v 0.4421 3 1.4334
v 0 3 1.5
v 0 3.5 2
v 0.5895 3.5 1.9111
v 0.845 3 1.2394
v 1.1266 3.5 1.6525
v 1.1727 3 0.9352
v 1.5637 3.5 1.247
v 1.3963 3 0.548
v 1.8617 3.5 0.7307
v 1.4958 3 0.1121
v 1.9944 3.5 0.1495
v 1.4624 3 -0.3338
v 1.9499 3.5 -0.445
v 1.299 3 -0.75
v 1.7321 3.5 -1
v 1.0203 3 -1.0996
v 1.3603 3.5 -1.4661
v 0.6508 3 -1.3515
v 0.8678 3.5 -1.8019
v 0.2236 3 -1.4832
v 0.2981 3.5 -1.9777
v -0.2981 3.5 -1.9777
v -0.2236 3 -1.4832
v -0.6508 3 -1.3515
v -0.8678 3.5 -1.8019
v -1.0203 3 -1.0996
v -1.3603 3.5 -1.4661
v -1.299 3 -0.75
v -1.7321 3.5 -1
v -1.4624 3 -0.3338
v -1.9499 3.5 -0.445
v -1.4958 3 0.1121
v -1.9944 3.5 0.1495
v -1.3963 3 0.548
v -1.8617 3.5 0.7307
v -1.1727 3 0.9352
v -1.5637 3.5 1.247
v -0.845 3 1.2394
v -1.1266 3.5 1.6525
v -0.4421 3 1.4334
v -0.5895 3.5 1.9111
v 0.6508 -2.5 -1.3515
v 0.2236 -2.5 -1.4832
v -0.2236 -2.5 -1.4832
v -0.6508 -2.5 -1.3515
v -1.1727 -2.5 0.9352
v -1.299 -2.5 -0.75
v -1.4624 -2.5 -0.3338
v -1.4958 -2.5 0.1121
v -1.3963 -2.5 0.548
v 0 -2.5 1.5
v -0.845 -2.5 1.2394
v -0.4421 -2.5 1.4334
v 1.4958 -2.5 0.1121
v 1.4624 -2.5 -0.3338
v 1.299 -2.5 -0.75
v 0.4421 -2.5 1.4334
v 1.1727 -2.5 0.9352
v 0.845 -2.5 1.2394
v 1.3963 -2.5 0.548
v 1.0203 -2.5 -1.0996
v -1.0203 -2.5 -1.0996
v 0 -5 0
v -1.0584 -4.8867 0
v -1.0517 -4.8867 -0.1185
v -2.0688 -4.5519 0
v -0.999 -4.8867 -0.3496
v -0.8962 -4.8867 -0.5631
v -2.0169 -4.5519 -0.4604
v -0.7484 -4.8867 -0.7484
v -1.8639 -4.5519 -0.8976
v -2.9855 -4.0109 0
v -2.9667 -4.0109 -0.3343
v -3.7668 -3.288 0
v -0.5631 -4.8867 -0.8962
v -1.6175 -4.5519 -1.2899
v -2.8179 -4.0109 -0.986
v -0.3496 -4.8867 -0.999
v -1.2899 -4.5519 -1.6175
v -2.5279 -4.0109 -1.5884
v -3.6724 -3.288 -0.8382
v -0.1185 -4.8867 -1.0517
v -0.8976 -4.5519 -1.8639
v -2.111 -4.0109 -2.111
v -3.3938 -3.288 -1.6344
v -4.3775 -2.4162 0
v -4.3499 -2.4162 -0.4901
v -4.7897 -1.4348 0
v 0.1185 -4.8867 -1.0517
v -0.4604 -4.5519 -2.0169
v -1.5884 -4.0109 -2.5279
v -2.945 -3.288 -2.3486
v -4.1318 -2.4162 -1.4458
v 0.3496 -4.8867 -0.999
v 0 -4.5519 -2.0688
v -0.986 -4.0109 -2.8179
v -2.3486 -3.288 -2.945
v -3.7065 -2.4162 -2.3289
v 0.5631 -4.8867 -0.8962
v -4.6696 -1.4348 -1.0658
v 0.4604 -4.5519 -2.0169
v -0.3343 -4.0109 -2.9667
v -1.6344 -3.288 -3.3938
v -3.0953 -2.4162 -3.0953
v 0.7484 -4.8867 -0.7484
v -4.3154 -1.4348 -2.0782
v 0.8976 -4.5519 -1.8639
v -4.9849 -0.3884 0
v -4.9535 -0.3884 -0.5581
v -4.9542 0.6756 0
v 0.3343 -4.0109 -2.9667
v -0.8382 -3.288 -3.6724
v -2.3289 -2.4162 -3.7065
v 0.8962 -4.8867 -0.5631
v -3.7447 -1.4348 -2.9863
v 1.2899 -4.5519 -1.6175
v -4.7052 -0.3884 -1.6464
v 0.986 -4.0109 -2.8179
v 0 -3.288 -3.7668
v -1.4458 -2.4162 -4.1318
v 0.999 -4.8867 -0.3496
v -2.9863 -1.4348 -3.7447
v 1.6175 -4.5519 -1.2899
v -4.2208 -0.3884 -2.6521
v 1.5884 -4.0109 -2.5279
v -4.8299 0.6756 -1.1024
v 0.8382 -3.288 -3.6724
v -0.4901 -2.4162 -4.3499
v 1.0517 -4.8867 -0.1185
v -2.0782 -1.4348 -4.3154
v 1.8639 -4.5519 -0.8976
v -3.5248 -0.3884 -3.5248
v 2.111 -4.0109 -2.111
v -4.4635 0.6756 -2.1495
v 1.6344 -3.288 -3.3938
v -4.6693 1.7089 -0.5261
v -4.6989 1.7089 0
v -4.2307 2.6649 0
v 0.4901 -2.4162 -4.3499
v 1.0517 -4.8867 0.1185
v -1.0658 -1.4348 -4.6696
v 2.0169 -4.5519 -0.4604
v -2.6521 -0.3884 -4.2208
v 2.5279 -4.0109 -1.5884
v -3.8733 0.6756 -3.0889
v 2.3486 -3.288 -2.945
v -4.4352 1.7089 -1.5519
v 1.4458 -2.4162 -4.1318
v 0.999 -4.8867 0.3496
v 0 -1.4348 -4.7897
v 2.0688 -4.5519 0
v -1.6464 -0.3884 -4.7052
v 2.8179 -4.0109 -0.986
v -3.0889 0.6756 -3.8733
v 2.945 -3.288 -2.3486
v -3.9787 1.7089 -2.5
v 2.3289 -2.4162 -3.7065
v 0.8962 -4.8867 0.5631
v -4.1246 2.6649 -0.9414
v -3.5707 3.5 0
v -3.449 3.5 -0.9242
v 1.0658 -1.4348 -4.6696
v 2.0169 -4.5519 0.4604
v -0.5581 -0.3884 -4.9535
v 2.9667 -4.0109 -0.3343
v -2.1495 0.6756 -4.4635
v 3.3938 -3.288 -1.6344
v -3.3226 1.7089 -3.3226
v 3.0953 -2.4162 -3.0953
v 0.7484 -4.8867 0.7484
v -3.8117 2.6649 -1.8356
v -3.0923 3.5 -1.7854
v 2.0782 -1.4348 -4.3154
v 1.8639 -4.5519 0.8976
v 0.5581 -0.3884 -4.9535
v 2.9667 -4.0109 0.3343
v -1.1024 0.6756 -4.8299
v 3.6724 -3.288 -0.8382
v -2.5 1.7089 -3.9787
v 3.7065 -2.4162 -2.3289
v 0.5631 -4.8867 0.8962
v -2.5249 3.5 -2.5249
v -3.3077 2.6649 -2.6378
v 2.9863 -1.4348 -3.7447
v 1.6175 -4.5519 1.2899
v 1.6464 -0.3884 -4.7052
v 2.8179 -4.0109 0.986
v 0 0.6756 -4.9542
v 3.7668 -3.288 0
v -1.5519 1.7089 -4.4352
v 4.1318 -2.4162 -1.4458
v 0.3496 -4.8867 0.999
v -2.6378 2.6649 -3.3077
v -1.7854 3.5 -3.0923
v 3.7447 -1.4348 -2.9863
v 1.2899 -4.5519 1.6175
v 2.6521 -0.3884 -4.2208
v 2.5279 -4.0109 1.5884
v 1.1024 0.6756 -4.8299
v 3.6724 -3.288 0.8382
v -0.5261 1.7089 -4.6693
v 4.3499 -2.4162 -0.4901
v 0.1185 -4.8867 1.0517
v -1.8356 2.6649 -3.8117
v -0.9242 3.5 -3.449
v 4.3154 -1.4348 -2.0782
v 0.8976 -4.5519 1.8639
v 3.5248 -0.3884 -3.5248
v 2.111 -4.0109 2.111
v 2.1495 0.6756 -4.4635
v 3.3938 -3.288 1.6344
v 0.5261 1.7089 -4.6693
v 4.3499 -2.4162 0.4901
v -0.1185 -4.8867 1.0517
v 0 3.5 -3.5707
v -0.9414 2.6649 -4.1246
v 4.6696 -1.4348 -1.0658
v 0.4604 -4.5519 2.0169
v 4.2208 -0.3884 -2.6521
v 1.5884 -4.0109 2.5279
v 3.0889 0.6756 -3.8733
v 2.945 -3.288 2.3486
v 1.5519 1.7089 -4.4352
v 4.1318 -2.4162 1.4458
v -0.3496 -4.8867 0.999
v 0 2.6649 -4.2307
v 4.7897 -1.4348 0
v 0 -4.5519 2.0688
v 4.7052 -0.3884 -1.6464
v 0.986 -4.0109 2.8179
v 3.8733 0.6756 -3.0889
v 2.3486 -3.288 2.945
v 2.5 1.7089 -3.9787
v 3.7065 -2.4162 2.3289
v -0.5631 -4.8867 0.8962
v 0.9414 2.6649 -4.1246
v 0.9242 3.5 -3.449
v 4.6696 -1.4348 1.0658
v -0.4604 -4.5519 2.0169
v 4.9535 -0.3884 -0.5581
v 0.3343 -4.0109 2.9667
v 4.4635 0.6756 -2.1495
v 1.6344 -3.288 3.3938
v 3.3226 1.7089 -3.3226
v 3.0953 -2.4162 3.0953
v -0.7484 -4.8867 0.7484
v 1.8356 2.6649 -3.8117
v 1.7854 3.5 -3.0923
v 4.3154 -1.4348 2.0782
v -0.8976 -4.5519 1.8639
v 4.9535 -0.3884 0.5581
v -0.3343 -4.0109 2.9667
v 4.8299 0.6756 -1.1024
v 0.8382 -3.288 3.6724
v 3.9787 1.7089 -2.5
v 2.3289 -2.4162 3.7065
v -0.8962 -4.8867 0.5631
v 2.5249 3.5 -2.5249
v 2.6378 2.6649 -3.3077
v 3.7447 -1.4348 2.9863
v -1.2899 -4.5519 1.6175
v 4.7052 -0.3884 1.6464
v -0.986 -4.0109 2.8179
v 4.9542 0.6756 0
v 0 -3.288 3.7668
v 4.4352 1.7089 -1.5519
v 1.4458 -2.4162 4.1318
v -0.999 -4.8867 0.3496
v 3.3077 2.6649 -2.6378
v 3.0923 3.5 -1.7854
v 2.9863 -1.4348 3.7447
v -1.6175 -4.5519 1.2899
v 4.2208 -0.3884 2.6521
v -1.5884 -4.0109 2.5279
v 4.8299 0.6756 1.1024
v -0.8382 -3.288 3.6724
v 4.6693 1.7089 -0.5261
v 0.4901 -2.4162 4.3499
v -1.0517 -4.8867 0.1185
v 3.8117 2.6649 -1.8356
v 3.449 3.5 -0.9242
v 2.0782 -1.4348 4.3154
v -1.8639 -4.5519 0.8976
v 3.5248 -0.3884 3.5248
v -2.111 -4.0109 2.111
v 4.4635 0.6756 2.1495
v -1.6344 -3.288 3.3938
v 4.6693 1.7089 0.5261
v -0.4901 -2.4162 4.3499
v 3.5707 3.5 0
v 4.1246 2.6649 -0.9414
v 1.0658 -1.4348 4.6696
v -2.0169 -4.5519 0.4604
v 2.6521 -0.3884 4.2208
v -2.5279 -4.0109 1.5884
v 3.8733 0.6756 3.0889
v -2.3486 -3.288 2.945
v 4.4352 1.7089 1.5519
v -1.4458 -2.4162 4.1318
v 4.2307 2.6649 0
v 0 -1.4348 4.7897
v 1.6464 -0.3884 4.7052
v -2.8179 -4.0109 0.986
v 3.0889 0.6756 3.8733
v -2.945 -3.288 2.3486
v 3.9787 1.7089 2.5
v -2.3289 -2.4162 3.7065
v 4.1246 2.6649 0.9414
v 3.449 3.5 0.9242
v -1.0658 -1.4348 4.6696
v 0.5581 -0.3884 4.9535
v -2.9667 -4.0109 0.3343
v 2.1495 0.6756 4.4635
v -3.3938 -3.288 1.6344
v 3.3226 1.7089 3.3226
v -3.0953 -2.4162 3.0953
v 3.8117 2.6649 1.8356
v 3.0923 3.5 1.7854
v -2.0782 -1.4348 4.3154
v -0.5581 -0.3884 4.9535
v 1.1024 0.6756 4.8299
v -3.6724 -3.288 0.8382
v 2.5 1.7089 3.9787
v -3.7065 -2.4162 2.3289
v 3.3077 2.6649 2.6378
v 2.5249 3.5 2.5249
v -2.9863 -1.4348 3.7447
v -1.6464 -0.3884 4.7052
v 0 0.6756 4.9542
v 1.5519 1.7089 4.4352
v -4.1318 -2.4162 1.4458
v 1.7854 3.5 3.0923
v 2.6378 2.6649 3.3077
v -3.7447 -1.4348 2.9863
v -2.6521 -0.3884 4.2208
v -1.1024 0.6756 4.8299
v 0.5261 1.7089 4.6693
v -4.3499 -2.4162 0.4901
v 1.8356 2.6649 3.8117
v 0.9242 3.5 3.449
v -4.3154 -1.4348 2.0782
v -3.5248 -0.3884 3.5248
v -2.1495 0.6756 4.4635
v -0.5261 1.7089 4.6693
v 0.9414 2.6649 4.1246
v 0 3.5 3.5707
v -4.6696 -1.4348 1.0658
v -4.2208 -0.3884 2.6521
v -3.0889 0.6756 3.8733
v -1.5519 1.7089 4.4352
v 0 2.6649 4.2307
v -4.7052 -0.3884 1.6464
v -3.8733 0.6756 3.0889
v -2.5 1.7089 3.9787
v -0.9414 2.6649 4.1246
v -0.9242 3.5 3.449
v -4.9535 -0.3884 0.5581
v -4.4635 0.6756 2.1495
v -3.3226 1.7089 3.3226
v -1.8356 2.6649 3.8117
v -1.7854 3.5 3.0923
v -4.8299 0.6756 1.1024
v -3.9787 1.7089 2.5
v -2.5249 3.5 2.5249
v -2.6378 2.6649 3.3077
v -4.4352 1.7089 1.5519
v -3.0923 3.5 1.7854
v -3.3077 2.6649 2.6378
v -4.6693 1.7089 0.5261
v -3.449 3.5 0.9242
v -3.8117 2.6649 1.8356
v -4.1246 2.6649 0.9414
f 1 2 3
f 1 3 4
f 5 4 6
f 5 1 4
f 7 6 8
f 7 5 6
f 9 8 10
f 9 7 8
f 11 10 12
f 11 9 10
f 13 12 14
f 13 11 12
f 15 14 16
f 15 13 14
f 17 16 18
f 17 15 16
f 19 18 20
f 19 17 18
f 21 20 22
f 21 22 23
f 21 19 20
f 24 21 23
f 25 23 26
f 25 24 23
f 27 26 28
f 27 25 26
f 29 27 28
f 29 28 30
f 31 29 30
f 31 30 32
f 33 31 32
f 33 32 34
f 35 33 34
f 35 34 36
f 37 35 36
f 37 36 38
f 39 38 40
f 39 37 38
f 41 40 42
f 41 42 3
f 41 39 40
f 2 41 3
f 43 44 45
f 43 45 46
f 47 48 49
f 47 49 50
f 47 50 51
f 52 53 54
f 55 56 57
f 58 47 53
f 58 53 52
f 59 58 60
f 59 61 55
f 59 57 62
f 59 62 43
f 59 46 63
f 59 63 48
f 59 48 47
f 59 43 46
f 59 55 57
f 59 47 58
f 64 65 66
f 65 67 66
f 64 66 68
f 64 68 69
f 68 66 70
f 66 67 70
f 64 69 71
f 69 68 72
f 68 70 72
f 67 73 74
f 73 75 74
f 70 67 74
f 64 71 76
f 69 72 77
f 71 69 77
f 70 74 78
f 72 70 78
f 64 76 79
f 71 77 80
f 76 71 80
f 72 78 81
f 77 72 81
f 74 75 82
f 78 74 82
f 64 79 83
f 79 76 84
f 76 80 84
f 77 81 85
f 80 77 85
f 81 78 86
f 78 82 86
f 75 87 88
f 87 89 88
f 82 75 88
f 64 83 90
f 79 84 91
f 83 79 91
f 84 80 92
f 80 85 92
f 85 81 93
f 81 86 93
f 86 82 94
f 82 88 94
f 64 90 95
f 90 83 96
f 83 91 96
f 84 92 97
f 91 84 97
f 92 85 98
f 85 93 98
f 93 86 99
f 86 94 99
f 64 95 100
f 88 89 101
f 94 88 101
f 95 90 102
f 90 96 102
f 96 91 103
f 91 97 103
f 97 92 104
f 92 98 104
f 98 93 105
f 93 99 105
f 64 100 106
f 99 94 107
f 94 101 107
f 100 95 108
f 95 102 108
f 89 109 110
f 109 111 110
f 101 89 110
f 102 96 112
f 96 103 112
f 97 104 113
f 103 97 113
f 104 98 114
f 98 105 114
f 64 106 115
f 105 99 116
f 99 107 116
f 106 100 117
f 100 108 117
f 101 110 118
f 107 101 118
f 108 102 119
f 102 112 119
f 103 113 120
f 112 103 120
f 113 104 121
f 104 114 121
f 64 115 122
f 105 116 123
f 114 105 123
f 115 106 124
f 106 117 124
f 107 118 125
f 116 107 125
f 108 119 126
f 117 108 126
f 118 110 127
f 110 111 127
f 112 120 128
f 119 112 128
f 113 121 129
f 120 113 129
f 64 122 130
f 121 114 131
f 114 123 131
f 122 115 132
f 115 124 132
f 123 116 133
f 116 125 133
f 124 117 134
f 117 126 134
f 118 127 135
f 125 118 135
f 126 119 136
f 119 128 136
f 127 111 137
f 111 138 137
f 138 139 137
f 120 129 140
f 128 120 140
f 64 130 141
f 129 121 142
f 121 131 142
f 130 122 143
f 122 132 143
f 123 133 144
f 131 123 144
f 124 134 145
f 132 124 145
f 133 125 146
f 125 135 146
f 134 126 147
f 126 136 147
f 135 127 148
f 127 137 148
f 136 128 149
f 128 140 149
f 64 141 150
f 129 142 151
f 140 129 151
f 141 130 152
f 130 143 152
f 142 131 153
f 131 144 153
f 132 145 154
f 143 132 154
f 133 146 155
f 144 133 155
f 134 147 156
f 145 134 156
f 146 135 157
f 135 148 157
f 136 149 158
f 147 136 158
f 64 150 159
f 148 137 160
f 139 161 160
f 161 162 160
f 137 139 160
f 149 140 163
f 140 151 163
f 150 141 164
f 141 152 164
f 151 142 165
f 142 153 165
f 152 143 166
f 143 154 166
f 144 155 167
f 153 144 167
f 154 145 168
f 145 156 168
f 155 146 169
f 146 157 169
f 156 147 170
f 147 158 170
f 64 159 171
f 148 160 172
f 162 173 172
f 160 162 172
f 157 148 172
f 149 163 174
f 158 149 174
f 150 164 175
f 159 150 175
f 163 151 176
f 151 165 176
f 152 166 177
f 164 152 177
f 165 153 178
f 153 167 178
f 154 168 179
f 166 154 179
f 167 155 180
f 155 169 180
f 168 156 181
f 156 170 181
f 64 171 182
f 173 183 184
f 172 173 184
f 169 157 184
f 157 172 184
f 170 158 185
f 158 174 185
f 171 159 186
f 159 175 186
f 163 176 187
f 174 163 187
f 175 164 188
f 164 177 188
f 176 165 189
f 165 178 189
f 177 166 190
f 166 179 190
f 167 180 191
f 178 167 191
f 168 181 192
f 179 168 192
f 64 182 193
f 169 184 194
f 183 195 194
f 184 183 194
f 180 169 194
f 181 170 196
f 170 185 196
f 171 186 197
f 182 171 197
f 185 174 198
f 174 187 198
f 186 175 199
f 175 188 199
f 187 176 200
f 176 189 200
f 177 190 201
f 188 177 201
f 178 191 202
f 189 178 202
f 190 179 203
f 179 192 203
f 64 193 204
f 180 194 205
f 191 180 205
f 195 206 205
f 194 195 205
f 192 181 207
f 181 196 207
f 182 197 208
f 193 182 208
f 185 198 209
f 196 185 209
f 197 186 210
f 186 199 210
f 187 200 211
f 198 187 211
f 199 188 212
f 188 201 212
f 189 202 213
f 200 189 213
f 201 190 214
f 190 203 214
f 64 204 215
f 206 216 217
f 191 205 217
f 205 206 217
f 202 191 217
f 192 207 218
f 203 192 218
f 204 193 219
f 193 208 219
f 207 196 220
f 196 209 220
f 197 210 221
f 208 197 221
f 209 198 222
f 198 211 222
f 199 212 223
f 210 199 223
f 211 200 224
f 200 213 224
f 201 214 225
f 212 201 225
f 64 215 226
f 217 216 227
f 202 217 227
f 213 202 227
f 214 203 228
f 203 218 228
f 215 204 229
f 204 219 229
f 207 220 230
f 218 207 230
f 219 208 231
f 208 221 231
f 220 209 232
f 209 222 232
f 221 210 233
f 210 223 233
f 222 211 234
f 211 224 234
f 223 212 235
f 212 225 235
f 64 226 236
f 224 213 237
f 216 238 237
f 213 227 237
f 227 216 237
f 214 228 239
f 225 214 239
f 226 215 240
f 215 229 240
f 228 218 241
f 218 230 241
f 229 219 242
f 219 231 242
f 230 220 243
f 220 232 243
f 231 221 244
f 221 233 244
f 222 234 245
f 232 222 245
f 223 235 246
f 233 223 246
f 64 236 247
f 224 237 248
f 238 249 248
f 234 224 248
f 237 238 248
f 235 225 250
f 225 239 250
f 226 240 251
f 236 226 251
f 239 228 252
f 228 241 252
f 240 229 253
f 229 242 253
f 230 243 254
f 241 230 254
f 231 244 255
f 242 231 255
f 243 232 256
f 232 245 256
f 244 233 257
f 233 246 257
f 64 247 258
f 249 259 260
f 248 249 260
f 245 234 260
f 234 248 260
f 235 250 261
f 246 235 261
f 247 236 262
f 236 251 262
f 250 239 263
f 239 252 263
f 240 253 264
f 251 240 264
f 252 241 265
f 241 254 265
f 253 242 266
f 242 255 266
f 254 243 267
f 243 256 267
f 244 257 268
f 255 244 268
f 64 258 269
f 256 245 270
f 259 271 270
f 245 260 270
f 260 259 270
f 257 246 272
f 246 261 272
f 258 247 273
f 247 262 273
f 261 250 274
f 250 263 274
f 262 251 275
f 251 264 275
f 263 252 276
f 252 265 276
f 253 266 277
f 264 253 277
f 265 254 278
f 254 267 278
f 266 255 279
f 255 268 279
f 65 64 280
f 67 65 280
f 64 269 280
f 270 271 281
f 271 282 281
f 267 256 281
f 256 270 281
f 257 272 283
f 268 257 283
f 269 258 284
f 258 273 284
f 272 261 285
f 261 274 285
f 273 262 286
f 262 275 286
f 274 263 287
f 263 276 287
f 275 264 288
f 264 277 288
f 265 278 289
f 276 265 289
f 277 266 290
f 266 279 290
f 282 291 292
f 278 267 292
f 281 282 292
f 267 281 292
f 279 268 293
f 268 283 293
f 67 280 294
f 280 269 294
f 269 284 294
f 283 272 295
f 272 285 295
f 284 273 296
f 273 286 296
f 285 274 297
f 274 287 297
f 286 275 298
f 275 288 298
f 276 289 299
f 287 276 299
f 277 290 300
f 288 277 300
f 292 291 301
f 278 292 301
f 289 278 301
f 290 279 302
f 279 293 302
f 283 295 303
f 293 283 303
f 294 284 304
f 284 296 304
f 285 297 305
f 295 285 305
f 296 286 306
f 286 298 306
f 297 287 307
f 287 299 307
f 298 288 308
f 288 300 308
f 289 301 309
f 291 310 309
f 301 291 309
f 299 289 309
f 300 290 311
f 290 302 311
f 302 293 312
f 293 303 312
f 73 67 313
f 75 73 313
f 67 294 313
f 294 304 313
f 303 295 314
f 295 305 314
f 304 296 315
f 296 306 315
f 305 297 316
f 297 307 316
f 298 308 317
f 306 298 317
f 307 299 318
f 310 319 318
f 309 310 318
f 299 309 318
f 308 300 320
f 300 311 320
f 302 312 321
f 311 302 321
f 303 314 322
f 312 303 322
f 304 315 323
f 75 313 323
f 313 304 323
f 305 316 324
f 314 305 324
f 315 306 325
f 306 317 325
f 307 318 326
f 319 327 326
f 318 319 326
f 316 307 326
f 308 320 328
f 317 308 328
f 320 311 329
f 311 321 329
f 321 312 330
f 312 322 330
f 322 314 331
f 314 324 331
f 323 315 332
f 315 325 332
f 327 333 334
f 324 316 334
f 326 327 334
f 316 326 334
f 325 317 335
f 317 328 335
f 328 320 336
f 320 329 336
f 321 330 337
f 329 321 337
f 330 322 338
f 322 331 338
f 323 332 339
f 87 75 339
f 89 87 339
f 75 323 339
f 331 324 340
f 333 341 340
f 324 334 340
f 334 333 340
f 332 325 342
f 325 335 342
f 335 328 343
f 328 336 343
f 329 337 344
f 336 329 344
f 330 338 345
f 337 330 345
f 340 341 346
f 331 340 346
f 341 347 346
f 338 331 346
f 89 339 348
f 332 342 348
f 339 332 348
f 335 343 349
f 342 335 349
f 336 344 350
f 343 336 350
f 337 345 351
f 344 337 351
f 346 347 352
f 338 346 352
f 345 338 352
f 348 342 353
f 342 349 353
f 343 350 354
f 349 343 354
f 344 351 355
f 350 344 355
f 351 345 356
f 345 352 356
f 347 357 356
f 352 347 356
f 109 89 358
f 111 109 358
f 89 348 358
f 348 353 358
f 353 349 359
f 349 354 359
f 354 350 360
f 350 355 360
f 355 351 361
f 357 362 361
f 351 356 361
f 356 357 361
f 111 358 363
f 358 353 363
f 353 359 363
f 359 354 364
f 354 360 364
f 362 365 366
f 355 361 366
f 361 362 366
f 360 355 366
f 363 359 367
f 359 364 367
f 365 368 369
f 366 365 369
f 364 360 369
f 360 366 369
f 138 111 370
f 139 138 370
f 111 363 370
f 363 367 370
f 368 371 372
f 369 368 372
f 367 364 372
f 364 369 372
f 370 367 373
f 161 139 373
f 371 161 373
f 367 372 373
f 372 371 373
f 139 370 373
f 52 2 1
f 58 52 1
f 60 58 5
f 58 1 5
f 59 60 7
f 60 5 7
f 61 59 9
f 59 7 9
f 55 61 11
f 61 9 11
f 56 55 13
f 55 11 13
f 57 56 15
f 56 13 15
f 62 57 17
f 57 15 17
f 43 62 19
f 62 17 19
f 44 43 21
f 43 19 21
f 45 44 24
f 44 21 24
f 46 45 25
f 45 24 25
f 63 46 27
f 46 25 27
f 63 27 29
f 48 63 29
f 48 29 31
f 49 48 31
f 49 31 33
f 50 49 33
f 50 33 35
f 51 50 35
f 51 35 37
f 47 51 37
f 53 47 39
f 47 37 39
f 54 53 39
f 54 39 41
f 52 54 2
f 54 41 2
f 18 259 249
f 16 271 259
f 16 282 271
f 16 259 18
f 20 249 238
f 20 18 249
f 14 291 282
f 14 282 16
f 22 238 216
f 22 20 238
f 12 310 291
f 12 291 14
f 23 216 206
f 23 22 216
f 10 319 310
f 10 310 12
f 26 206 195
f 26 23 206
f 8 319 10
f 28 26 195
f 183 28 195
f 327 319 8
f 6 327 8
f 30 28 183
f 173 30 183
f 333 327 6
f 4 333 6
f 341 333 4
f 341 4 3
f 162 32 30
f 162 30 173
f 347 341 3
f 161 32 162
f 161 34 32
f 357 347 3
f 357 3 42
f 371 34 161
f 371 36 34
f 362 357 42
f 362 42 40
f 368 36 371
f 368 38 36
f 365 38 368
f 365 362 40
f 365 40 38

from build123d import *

# Parameters (mm, degrees)
SCHIZZO3_R               = 1.5
TAGLIO_ESTRUSIONE1_DEPTH = 6
SMUSSO1_SIZE             = 0.5


with BuildPart() as part:
    # Schizzo1 → Rivoluzione1 (revolve)
    with BuildSketch(Plane.XY):
        with BuildLine():
            Line((0, 5), (0, -5))
            ThreePointArc((0, -5), (-5, 0), (0, 5))
        make_face()
    revolve(axis=Axis((0, 5, 0), (0, -1, 0)))

    # Schizzo2 → Taglia-Rivoluzione1 (revolve, cut)
    with BuildSketch(Plane.XY, mode=Mode.PRIVATE) as taglia_rivoluzione1_sk:
        with BuildLine():
            Line((0, 3.5), (-3.570714214, 3.5))
            ThreePointArc((-3.570714214, 3.5), (-1.936491673, 4.609772229), (0, 5))
            Line((0, 5), (0, 3.5))
        make_face()
    revolve(taglia_rivoluzione1_sk.sketch.rotate(Axis((0, 5, 0), (0, -1, 0)), 180), axis=Axis((0, 5, 0), (0, -1, 0)), mode=Mode.SUBTRACT)

    # Schizzo3 → Taglio-Estrusione1 (cut)
    with BuildSketch(Plane(origin=(0, 3.5, 0), x_dir=(1, 0, 0), z_dir=(0, 1, 0))):
        with Locations(Location((0, 0, 0), (0, 0, 270))):
            Circle(SCHIZZO3_R)
    extrude(amount=-TAGLIO_ESTRUSIONE1_DEPTH, mode=Mode.SUBTRACT)

    # Smusso1
    smusso1_edges = [part.edges().sort_by_distance(p)[0] for p in [
        (0, 3.5, -1.5),
    ]]
    chamfer(smusso1_edges, length=SMUSSO1_SIZE)


solid = part.part
